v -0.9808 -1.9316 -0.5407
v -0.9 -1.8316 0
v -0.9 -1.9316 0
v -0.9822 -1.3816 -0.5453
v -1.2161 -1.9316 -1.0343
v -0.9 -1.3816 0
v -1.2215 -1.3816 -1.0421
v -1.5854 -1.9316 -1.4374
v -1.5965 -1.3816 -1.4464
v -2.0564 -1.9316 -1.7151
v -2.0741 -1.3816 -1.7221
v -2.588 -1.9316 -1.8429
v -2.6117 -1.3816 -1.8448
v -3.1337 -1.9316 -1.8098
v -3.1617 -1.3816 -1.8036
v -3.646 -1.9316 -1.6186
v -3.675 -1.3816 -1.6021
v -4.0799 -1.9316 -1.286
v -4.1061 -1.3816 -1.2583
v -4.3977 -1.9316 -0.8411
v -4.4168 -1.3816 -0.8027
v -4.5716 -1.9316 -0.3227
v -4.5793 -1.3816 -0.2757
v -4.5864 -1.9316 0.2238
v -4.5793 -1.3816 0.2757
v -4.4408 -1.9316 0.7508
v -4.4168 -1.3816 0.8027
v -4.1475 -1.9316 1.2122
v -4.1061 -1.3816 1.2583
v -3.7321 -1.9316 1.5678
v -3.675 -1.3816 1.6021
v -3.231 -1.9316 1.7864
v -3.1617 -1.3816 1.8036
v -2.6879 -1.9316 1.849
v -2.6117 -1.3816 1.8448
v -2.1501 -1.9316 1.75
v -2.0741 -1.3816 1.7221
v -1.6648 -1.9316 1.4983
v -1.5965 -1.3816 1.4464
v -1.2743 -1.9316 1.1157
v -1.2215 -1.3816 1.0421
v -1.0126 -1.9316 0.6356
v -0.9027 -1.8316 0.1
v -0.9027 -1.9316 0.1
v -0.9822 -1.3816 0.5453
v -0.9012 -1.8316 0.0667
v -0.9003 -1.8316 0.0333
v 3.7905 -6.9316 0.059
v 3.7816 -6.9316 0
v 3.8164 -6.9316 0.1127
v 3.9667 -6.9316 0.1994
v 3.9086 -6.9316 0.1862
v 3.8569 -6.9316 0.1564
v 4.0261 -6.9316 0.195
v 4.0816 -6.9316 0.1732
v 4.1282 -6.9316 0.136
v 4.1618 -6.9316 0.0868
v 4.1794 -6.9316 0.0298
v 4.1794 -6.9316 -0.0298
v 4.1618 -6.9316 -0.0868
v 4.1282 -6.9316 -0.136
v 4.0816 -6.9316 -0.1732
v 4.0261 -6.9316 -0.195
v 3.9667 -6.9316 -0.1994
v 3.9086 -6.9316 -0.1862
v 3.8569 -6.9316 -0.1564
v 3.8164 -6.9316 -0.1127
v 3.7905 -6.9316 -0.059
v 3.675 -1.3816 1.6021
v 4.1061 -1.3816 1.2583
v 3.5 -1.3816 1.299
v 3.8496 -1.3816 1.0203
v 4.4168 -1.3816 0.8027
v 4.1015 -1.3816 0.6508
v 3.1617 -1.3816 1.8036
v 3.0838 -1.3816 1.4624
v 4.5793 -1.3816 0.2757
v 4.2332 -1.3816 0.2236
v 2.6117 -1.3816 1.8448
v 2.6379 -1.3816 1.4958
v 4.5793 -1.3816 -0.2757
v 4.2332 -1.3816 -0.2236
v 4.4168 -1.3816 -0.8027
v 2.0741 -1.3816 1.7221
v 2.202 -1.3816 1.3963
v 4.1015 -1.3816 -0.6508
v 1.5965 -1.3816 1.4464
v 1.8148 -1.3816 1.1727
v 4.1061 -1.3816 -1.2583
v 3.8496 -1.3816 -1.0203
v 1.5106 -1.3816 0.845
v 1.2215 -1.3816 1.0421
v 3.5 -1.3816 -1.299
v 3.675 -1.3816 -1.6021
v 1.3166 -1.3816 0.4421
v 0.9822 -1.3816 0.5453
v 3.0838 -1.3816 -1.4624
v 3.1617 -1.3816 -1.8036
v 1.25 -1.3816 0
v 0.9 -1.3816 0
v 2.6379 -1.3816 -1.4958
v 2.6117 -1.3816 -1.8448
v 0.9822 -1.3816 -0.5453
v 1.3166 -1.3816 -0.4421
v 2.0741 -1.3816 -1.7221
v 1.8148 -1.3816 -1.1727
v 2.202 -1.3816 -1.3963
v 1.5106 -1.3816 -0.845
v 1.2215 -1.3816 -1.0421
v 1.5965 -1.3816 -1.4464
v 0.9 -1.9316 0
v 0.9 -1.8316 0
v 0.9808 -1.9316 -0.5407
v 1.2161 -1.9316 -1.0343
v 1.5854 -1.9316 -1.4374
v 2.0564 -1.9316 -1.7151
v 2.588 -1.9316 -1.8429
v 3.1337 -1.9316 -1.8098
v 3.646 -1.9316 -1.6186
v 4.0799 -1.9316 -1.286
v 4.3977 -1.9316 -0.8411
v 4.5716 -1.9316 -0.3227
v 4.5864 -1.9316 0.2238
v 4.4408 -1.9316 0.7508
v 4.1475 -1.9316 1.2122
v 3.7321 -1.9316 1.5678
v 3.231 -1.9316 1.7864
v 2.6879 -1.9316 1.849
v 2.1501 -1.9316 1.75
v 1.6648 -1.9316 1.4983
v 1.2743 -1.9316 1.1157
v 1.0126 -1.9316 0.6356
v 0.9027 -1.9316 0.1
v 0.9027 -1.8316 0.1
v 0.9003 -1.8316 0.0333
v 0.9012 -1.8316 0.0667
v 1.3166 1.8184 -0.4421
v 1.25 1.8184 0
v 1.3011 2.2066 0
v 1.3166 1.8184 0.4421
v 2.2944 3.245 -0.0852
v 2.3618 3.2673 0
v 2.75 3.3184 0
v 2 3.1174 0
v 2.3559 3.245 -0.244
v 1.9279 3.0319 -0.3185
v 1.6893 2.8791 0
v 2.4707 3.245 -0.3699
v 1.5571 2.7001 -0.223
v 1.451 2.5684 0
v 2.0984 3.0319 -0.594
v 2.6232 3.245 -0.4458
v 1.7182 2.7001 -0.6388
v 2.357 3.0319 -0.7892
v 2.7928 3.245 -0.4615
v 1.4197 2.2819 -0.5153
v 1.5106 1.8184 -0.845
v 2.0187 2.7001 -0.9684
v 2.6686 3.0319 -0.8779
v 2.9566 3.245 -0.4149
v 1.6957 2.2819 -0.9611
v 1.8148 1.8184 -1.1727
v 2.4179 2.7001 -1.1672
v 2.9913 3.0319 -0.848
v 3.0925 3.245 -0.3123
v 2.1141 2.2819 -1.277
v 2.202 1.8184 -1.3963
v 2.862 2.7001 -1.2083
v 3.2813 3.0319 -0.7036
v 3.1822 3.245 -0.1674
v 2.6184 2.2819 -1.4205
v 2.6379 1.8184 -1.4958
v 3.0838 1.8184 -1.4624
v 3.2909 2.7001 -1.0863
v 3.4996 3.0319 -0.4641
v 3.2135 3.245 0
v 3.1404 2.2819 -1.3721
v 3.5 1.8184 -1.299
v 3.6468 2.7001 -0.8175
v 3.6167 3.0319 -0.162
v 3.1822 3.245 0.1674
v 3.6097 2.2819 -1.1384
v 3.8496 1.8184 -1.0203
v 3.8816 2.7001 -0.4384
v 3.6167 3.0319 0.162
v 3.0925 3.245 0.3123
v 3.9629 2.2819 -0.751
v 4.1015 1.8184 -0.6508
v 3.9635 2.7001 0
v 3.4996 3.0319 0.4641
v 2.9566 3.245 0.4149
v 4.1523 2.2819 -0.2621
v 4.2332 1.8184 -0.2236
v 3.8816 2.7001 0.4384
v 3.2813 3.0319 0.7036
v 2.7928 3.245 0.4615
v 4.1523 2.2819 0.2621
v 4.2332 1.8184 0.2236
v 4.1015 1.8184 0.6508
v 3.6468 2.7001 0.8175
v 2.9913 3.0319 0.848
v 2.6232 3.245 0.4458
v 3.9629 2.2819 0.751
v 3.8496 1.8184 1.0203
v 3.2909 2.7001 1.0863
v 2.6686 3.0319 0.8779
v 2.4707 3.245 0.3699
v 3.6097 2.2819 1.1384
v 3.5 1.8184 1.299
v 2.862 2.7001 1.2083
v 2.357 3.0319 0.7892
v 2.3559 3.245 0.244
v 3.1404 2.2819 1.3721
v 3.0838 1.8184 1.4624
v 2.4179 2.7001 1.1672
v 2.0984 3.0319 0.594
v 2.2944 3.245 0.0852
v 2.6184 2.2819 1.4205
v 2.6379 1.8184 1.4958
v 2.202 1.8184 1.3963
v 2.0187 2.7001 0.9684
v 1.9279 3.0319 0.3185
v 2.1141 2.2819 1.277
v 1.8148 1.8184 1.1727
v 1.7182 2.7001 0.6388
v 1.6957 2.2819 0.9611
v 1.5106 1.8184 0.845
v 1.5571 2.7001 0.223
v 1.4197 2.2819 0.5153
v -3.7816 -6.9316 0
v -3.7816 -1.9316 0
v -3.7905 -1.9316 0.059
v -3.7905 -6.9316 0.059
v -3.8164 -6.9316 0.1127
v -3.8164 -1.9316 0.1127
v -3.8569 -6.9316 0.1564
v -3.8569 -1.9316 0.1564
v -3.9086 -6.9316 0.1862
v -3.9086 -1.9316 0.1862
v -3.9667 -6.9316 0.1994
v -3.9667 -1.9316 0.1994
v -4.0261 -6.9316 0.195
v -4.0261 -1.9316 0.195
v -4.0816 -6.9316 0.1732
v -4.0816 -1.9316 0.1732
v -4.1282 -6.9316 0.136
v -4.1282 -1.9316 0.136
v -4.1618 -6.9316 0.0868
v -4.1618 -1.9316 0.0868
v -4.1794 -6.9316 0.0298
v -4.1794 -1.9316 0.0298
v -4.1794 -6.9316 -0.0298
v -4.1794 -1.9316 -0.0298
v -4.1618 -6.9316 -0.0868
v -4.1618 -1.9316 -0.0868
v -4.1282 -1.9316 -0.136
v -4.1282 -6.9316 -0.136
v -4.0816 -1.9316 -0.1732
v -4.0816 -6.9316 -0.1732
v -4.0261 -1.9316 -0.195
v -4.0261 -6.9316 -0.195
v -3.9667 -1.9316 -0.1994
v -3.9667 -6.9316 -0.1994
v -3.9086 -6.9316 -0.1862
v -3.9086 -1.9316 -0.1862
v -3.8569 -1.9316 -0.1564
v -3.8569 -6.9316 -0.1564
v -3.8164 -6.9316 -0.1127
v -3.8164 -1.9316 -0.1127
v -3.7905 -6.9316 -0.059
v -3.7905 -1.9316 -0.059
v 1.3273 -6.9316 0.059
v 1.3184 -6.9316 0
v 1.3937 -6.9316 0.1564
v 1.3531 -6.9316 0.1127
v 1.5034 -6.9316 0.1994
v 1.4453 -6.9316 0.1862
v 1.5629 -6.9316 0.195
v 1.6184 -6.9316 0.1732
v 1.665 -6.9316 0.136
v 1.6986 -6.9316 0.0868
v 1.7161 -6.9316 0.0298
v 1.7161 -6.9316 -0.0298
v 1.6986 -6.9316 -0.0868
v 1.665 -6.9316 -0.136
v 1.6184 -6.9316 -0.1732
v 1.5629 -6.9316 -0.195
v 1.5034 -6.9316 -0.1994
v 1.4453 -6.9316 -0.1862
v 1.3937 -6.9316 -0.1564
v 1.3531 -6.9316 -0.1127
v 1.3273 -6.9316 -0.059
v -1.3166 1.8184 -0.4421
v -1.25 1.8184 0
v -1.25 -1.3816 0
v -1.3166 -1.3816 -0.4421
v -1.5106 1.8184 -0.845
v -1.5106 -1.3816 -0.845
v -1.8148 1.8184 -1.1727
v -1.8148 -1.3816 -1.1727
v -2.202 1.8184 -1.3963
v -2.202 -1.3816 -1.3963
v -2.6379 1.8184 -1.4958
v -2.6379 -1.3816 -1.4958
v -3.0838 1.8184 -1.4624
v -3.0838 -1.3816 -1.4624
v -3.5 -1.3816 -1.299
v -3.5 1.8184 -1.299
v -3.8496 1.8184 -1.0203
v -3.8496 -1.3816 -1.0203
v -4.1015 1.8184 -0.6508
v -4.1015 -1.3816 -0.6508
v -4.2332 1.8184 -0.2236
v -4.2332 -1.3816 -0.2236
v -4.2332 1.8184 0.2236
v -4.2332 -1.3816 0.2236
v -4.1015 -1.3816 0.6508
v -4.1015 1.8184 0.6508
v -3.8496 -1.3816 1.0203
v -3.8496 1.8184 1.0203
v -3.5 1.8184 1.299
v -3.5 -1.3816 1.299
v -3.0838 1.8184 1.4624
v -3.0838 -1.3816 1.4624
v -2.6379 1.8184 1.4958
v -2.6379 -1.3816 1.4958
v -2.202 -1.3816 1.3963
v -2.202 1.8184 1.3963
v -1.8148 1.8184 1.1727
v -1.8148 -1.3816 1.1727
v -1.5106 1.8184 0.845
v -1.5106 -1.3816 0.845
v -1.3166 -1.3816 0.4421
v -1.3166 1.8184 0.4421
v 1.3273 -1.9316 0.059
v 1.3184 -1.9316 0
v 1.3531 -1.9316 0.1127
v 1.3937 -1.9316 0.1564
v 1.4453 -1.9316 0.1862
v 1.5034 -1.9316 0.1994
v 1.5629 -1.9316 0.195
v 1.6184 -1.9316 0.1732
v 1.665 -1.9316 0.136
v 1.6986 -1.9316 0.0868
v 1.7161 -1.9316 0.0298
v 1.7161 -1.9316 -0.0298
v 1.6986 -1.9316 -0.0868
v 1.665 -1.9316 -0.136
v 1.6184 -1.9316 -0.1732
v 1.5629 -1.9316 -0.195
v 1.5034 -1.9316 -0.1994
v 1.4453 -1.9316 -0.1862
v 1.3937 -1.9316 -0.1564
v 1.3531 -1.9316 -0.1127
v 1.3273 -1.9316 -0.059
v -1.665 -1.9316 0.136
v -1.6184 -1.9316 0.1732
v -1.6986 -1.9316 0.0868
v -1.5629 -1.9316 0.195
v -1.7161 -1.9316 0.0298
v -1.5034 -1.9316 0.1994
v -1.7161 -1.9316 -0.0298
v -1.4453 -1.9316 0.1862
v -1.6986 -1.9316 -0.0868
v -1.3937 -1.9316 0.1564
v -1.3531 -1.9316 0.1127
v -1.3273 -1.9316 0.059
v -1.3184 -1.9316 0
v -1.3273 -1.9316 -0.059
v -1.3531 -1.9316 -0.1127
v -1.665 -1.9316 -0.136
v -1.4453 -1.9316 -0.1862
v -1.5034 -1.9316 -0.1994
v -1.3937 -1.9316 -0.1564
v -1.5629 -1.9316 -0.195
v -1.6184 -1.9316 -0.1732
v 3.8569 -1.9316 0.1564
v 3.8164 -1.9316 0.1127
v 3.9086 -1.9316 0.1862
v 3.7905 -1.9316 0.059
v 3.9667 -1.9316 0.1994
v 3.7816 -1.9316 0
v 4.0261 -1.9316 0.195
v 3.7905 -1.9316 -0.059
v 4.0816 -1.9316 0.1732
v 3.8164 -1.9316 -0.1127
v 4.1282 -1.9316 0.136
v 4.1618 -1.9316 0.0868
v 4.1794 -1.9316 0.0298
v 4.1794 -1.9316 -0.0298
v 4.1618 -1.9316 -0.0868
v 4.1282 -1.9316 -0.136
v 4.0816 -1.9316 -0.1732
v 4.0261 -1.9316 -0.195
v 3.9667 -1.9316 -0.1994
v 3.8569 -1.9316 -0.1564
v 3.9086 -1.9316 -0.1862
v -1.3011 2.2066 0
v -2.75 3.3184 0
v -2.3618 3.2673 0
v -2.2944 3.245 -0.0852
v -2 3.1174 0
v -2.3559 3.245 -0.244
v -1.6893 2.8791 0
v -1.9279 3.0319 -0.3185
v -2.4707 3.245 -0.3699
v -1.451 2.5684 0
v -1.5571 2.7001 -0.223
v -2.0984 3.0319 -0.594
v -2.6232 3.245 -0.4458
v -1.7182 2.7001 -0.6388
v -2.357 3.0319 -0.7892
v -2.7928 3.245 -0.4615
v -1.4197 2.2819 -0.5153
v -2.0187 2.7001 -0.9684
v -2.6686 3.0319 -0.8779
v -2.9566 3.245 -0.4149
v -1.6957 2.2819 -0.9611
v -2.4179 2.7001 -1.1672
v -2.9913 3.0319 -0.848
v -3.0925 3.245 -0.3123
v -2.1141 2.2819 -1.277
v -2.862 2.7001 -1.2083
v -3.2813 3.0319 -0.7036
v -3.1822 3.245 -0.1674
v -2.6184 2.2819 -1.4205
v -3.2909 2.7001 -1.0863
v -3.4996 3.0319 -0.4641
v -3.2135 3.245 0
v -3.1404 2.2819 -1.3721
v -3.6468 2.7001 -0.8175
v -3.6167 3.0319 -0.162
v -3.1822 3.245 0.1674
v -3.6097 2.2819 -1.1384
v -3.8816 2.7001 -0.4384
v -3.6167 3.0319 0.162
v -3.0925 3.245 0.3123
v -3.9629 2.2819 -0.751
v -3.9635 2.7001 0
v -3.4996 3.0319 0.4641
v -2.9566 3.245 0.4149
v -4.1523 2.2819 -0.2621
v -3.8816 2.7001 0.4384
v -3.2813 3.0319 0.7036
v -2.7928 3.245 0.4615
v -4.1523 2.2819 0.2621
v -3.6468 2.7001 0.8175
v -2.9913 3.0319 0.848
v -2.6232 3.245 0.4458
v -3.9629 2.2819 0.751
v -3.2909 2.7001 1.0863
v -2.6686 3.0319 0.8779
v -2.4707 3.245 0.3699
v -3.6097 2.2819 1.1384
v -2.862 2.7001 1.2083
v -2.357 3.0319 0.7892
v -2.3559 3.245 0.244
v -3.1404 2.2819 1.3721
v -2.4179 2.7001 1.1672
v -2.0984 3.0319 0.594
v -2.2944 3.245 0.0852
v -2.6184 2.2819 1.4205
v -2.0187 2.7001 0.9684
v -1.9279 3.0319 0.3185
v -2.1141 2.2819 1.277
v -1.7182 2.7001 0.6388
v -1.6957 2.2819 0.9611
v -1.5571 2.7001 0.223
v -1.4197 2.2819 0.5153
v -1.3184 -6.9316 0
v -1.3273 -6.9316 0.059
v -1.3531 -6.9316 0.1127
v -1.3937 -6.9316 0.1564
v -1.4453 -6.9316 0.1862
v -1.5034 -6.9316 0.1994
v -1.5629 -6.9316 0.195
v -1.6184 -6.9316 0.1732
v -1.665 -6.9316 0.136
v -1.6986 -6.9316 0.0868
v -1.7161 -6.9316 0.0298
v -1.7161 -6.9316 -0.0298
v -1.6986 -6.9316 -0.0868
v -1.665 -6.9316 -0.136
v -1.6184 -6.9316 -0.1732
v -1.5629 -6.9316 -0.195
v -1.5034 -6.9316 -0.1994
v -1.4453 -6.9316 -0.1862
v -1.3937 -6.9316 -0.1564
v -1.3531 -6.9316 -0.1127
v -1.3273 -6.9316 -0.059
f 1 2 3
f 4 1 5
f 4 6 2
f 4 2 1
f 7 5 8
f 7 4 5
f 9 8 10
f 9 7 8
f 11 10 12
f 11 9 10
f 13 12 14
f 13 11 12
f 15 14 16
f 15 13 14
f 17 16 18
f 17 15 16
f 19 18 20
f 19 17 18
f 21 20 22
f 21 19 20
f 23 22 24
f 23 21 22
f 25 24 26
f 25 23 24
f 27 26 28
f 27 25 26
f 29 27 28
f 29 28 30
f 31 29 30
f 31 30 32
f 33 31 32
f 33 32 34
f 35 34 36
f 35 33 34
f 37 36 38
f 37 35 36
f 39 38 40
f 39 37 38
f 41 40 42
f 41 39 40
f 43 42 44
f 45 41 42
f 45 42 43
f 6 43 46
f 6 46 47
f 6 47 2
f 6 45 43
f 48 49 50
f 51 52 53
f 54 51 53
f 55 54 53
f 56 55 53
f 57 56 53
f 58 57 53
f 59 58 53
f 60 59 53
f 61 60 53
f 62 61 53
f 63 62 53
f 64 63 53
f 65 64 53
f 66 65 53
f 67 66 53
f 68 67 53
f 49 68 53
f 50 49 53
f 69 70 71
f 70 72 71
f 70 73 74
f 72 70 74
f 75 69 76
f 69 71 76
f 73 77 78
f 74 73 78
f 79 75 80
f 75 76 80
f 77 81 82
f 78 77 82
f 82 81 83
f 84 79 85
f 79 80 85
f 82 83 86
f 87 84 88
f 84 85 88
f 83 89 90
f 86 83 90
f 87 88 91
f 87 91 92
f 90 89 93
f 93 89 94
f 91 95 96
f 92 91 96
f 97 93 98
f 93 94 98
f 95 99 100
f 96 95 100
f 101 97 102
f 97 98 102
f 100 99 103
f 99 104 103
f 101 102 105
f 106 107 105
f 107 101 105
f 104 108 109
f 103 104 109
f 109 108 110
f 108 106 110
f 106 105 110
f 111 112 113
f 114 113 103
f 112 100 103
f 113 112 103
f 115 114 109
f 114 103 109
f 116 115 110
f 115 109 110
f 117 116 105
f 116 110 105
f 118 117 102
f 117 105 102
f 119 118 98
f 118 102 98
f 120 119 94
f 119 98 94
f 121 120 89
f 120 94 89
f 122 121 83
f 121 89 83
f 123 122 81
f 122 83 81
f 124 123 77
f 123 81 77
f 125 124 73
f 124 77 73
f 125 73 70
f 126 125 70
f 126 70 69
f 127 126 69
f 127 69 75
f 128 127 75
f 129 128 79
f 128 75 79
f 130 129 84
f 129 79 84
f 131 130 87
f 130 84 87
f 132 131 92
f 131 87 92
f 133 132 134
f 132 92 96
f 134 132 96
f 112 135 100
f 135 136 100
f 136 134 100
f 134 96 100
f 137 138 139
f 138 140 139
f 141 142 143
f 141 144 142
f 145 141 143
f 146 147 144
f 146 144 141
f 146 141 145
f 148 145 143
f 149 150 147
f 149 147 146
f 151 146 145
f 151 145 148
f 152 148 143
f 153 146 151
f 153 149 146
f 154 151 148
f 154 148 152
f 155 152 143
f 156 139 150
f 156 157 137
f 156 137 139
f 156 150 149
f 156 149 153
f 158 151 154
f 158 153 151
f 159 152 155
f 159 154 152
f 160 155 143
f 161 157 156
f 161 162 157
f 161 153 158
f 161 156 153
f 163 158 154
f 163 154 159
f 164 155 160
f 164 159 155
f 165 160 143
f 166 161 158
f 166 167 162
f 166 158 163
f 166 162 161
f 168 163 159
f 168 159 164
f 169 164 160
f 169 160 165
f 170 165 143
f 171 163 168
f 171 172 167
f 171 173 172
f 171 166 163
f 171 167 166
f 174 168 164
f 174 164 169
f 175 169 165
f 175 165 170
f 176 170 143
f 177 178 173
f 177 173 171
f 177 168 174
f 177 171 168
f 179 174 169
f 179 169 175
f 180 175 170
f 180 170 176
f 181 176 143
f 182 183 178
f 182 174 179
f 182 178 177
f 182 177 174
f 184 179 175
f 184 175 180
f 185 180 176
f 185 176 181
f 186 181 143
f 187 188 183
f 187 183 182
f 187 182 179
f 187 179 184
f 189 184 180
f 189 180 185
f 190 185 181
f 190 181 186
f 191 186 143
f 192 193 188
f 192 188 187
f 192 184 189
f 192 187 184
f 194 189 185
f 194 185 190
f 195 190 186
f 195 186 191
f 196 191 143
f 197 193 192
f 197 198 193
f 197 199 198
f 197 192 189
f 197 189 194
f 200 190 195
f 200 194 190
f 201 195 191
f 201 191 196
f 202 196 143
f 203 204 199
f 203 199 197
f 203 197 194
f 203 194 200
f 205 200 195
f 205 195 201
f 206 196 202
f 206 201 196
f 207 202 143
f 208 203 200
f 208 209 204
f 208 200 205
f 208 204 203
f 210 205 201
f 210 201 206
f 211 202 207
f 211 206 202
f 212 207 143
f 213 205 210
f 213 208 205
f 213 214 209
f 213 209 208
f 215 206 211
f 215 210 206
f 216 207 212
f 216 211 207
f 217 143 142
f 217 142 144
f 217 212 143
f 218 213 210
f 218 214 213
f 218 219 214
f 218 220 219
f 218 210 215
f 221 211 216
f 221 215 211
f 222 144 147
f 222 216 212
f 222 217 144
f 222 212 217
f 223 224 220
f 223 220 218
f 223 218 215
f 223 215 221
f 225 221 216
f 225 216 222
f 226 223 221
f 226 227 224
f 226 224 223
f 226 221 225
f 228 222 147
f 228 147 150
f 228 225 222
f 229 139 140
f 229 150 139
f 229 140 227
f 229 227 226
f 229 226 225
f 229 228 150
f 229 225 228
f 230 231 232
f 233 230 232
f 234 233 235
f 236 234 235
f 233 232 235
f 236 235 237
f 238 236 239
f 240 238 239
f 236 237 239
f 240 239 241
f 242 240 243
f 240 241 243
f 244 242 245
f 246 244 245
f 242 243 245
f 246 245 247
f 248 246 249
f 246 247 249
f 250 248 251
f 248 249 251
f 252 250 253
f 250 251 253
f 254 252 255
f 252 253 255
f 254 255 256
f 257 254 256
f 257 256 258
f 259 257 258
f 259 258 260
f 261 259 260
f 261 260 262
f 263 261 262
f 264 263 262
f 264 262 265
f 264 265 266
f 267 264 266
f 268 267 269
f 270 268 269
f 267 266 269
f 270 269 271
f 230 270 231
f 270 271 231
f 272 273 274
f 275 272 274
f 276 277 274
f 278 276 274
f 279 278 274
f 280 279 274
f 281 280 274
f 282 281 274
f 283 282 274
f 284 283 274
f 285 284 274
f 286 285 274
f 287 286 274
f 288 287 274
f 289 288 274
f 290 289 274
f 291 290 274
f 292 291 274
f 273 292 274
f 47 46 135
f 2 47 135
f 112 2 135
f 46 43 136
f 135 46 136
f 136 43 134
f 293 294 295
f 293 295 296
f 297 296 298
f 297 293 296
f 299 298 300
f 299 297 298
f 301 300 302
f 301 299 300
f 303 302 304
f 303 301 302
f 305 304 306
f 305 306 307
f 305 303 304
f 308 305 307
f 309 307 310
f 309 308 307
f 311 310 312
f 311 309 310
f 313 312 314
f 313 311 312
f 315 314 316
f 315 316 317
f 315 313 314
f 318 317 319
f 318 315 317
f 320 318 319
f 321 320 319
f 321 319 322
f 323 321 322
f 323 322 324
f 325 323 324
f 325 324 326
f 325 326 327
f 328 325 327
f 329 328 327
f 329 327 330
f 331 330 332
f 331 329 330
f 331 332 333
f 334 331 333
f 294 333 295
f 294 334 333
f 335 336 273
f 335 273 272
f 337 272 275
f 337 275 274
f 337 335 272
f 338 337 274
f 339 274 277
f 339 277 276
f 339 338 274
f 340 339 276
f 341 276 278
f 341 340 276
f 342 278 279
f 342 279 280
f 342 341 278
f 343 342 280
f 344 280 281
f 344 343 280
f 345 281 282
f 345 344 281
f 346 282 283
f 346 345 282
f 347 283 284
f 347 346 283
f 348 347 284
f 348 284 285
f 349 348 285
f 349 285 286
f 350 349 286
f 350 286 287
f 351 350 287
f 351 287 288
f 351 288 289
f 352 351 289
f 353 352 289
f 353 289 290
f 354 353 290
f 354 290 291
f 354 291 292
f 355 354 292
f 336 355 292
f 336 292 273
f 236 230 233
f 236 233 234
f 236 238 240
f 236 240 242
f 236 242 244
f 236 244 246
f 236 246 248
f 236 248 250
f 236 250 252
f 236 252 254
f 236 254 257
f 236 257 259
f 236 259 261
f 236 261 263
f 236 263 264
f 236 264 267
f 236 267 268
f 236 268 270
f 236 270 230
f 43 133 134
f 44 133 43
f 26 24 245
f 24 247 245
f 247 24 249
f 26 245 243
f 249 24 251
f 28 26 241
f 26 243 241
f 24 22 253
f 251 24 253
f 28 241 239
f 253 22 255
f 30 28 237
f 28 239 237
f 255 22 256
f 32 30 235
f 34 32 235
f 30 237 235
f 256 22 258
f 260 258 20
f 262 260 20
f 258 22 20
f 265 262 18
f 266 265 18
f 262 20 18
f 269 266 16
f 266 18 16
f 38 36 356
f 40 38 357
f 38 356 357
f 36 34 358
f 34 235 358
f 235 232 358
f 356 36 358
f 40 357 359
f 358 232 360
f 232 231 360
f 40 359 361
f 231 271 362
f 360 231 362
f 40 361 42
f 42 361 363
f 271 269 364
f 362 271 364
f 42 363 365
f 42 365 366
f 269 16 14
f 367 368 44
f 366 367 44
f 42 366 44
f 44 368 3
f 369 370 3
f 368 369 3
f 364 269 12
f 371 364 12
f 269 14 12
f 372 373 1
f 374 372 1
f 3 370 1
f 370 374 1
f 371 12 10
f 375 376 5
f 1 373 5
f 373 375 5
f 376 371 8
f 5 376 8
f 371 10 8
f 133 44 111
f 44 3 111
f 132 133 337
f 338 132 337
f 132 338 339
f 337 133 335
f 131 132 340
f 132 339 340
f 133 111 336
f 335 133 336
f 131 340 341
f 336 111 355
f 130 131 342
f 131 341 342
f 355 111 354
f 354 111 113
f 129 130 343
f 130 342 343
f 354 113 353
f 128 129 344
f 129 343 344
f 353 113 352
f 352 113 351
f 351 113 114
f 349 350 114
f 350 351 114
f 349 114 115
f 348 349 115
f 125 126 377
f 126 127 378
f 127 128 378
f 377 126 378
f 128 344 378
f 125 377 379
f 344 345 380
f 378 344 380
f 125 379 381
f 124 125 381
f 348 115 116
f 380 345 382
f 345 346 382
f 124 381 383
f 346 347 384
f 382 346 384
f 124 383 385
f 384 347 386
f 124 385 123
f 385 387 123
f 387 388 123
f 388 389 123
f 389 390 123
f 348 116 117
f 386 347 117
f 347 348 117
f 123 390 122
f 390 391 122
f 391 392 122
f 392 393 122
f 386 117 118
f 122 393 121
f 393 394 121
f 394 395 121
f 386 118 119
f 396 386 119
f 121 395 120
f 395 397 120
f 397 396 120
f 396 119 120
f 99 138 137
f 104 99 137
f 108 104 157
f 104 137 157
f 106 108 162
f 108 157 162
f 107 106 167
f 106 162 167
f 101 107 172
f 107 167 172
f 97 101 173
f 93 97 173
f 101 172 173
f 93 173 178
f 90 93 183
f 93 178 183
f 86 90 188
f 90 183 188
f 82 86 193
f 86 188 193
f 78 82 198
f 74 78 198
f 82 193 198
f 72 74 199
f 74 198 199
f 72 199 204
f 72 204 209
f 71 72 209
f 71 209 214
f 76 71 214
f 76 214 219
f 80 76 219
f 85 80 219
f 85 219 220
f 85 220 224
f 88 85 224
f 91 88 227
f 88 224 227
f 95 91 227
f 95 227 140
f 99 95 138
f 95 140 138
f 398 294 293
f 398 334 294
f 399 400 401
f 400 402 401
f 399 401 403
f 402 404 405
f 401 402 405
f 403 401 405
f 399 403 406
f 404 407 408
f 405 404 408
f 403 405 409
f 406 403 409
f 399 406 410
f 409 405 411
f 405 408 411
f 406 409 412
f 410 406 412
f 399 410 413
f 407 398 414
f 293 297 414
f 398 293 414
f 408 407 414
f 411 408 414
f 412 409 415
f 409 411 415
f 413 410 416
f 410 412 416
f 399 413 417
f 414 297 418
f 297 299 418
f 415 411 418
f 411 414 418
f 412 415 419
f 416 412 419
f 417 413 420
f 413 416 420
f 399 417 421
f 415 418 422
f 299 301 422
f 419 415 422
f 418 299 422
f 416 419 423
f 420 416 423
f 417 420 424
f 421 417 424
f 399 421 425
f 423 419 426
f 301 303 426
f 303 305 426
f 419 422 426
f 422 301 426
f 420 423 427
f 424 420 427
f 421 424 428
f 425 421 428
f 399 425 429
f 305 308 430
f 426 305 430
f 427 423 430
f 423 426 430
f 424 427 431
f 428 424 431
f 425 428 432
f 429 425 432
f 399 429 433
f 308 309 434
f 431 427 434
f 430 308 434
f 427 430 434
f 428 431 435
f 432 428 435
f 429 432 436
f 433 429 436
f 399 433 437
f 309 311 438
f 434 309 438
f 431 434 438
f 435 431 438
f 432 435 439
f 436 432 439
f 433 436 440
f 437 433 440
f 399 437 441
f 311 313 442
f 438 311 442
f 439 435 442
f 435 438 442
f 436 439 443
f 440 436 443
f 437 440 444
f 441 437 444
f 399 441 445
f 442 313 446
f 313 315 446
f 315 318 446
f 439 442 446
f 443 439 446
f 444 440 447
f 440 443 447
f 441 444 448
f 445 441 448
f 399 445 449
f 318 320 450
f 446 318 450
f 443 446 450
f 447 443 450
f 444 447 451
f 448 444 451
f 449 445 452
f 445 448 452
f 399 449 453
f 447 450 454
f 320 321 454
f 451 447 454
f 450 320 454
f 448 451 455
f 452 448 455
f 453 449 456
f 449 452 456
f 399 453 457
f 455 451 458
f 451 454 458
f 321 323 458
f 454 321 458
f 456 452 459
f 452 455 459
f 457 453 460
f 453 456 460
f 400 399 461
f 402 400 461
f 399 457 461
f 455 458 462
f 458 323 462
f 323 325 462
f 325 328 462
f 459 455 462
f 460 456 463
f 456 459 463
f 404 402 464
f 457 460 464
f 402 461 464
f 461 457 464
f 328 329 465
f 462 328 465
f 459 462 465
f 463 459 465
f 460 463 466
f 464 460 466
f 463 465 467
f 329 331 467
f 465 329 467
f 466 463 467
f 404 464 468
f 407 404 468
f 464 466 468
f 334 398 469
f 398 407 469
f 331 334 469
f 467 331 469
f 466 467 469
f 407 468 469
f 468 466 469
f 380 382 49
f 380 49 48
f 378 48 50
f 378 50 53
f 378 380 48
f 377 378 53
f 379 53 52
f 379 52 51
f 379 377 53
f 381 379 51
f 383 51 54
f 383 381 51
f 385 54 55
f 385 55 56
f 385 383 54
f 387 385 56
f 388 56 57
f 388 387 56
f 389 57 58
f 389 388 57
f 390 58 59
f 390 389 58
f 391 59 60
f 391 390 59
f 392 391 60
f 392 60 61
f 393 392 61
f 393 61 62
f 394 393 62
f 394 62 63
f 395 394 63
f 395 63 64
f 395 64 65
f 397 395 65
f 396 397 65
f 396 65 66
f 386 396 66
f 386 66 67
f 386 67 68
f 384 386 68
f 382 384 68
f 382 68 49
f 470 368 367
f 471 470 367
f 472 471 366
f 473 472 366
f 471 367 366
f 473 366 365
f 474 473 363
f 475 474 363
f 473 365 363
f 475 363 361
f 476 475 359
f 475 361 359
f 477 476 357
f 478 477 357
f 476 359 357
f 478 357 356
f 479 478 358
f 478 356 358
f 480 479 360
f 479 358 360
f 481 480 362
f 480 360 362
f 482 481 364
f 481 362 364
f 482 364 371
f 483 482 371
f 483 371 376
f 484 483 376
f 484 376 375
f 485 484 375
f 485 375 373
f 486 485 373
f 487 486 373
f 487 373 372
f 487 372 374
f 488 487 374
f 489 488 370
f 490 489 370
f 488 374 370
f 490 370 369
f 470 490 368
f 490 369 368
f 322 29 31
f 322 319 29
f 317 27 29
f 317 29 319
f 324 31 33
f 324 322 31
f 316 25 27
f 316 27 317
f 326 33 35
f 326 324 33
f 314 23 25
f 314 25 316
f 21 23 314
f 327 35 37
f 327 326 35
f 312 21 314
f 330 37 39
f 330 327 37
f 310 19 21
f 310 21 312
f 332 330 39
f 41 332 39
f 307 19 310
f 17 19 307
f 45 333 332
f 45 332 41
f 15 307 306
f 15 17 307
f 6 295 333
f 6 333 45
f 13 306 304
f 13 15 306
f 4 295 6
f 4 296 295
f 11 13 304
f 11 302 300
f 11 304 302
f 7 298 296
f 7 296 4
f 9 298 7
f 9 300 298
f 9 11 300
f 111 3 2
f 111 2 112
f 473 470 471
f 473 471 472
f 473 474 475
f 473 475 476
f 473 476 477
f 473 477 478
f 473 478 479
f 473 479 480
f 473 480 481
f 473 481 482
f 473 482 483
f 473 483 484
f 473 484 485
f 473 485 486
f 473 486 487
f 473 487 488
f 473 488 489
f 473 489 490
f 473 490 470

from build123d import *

# Parameters (mm, degrees)
F2_R     = 1.5
F3_R     = 0.2
F4_DEPTH = 5
F6_DEPTH = 0.1


with BuildPart() as f1:
    # F0 (on Top) → F1 (revolve)
    with BuildSketch(Plane.XY):
        Polygon((-1.25, 3.3184025263), (-2.75, 3.3184025263), (-2.75, -1.9315974737), (-1.25, -1.9315974737), (-0.9, -1.9315974737), (-0.9, -1.3815974737), (-1.25, -1.3815974737), align=None)
    revolve(axis=Axis((-2.75, 2.1103734641, 0), (0, 1, 0)))

    # F2
    f2_edges = [f1.edges().sort_by_distance(p)[0] for p in [
        (-4.25, 3.318403, 0),
    ]]
    fillet(f2_edges, radius=F2_R)

    # F3 (on face) → F4 (join)
    with BuildSketch(Plane.XZ.offset(1.9315974737)):
        with Locations((-1.5183771327, 0)):
            Circle(F3_R)
        with Locations((-3.9816228673, 0)):
            Circle(F3_R)
    extrude(amount=F4_DEPTH)


with BuildPart() as f5_1:
    # F5: instance of F1
    add(f1.part.mirror(Plane.YZ))


with BuildPart() as f1_1:
    add(f1.part)

    add(f5_1.part)  # F6 merges F5_1
    # F3 (on face) → F6 (join)
    with BuildSketch(Plane.XZ.offset(1.9315974737)):
        with BuildLine():
            Line((4.0972953202, 0.1), (-0.9027046798, 0.1))
            ThreePointArc((-0.9027046798, 0.1), (-0.9006762936, 0.0500182849), (-0.9, 0))
            Line((-0.9, 0), (4.0972953202, 0))
            Line((4.0972953202, 0), (4.0972953202, 0.1))
        make_face()
    extrude(amount=-F6_DEPTH)


solid = f1_1.part
